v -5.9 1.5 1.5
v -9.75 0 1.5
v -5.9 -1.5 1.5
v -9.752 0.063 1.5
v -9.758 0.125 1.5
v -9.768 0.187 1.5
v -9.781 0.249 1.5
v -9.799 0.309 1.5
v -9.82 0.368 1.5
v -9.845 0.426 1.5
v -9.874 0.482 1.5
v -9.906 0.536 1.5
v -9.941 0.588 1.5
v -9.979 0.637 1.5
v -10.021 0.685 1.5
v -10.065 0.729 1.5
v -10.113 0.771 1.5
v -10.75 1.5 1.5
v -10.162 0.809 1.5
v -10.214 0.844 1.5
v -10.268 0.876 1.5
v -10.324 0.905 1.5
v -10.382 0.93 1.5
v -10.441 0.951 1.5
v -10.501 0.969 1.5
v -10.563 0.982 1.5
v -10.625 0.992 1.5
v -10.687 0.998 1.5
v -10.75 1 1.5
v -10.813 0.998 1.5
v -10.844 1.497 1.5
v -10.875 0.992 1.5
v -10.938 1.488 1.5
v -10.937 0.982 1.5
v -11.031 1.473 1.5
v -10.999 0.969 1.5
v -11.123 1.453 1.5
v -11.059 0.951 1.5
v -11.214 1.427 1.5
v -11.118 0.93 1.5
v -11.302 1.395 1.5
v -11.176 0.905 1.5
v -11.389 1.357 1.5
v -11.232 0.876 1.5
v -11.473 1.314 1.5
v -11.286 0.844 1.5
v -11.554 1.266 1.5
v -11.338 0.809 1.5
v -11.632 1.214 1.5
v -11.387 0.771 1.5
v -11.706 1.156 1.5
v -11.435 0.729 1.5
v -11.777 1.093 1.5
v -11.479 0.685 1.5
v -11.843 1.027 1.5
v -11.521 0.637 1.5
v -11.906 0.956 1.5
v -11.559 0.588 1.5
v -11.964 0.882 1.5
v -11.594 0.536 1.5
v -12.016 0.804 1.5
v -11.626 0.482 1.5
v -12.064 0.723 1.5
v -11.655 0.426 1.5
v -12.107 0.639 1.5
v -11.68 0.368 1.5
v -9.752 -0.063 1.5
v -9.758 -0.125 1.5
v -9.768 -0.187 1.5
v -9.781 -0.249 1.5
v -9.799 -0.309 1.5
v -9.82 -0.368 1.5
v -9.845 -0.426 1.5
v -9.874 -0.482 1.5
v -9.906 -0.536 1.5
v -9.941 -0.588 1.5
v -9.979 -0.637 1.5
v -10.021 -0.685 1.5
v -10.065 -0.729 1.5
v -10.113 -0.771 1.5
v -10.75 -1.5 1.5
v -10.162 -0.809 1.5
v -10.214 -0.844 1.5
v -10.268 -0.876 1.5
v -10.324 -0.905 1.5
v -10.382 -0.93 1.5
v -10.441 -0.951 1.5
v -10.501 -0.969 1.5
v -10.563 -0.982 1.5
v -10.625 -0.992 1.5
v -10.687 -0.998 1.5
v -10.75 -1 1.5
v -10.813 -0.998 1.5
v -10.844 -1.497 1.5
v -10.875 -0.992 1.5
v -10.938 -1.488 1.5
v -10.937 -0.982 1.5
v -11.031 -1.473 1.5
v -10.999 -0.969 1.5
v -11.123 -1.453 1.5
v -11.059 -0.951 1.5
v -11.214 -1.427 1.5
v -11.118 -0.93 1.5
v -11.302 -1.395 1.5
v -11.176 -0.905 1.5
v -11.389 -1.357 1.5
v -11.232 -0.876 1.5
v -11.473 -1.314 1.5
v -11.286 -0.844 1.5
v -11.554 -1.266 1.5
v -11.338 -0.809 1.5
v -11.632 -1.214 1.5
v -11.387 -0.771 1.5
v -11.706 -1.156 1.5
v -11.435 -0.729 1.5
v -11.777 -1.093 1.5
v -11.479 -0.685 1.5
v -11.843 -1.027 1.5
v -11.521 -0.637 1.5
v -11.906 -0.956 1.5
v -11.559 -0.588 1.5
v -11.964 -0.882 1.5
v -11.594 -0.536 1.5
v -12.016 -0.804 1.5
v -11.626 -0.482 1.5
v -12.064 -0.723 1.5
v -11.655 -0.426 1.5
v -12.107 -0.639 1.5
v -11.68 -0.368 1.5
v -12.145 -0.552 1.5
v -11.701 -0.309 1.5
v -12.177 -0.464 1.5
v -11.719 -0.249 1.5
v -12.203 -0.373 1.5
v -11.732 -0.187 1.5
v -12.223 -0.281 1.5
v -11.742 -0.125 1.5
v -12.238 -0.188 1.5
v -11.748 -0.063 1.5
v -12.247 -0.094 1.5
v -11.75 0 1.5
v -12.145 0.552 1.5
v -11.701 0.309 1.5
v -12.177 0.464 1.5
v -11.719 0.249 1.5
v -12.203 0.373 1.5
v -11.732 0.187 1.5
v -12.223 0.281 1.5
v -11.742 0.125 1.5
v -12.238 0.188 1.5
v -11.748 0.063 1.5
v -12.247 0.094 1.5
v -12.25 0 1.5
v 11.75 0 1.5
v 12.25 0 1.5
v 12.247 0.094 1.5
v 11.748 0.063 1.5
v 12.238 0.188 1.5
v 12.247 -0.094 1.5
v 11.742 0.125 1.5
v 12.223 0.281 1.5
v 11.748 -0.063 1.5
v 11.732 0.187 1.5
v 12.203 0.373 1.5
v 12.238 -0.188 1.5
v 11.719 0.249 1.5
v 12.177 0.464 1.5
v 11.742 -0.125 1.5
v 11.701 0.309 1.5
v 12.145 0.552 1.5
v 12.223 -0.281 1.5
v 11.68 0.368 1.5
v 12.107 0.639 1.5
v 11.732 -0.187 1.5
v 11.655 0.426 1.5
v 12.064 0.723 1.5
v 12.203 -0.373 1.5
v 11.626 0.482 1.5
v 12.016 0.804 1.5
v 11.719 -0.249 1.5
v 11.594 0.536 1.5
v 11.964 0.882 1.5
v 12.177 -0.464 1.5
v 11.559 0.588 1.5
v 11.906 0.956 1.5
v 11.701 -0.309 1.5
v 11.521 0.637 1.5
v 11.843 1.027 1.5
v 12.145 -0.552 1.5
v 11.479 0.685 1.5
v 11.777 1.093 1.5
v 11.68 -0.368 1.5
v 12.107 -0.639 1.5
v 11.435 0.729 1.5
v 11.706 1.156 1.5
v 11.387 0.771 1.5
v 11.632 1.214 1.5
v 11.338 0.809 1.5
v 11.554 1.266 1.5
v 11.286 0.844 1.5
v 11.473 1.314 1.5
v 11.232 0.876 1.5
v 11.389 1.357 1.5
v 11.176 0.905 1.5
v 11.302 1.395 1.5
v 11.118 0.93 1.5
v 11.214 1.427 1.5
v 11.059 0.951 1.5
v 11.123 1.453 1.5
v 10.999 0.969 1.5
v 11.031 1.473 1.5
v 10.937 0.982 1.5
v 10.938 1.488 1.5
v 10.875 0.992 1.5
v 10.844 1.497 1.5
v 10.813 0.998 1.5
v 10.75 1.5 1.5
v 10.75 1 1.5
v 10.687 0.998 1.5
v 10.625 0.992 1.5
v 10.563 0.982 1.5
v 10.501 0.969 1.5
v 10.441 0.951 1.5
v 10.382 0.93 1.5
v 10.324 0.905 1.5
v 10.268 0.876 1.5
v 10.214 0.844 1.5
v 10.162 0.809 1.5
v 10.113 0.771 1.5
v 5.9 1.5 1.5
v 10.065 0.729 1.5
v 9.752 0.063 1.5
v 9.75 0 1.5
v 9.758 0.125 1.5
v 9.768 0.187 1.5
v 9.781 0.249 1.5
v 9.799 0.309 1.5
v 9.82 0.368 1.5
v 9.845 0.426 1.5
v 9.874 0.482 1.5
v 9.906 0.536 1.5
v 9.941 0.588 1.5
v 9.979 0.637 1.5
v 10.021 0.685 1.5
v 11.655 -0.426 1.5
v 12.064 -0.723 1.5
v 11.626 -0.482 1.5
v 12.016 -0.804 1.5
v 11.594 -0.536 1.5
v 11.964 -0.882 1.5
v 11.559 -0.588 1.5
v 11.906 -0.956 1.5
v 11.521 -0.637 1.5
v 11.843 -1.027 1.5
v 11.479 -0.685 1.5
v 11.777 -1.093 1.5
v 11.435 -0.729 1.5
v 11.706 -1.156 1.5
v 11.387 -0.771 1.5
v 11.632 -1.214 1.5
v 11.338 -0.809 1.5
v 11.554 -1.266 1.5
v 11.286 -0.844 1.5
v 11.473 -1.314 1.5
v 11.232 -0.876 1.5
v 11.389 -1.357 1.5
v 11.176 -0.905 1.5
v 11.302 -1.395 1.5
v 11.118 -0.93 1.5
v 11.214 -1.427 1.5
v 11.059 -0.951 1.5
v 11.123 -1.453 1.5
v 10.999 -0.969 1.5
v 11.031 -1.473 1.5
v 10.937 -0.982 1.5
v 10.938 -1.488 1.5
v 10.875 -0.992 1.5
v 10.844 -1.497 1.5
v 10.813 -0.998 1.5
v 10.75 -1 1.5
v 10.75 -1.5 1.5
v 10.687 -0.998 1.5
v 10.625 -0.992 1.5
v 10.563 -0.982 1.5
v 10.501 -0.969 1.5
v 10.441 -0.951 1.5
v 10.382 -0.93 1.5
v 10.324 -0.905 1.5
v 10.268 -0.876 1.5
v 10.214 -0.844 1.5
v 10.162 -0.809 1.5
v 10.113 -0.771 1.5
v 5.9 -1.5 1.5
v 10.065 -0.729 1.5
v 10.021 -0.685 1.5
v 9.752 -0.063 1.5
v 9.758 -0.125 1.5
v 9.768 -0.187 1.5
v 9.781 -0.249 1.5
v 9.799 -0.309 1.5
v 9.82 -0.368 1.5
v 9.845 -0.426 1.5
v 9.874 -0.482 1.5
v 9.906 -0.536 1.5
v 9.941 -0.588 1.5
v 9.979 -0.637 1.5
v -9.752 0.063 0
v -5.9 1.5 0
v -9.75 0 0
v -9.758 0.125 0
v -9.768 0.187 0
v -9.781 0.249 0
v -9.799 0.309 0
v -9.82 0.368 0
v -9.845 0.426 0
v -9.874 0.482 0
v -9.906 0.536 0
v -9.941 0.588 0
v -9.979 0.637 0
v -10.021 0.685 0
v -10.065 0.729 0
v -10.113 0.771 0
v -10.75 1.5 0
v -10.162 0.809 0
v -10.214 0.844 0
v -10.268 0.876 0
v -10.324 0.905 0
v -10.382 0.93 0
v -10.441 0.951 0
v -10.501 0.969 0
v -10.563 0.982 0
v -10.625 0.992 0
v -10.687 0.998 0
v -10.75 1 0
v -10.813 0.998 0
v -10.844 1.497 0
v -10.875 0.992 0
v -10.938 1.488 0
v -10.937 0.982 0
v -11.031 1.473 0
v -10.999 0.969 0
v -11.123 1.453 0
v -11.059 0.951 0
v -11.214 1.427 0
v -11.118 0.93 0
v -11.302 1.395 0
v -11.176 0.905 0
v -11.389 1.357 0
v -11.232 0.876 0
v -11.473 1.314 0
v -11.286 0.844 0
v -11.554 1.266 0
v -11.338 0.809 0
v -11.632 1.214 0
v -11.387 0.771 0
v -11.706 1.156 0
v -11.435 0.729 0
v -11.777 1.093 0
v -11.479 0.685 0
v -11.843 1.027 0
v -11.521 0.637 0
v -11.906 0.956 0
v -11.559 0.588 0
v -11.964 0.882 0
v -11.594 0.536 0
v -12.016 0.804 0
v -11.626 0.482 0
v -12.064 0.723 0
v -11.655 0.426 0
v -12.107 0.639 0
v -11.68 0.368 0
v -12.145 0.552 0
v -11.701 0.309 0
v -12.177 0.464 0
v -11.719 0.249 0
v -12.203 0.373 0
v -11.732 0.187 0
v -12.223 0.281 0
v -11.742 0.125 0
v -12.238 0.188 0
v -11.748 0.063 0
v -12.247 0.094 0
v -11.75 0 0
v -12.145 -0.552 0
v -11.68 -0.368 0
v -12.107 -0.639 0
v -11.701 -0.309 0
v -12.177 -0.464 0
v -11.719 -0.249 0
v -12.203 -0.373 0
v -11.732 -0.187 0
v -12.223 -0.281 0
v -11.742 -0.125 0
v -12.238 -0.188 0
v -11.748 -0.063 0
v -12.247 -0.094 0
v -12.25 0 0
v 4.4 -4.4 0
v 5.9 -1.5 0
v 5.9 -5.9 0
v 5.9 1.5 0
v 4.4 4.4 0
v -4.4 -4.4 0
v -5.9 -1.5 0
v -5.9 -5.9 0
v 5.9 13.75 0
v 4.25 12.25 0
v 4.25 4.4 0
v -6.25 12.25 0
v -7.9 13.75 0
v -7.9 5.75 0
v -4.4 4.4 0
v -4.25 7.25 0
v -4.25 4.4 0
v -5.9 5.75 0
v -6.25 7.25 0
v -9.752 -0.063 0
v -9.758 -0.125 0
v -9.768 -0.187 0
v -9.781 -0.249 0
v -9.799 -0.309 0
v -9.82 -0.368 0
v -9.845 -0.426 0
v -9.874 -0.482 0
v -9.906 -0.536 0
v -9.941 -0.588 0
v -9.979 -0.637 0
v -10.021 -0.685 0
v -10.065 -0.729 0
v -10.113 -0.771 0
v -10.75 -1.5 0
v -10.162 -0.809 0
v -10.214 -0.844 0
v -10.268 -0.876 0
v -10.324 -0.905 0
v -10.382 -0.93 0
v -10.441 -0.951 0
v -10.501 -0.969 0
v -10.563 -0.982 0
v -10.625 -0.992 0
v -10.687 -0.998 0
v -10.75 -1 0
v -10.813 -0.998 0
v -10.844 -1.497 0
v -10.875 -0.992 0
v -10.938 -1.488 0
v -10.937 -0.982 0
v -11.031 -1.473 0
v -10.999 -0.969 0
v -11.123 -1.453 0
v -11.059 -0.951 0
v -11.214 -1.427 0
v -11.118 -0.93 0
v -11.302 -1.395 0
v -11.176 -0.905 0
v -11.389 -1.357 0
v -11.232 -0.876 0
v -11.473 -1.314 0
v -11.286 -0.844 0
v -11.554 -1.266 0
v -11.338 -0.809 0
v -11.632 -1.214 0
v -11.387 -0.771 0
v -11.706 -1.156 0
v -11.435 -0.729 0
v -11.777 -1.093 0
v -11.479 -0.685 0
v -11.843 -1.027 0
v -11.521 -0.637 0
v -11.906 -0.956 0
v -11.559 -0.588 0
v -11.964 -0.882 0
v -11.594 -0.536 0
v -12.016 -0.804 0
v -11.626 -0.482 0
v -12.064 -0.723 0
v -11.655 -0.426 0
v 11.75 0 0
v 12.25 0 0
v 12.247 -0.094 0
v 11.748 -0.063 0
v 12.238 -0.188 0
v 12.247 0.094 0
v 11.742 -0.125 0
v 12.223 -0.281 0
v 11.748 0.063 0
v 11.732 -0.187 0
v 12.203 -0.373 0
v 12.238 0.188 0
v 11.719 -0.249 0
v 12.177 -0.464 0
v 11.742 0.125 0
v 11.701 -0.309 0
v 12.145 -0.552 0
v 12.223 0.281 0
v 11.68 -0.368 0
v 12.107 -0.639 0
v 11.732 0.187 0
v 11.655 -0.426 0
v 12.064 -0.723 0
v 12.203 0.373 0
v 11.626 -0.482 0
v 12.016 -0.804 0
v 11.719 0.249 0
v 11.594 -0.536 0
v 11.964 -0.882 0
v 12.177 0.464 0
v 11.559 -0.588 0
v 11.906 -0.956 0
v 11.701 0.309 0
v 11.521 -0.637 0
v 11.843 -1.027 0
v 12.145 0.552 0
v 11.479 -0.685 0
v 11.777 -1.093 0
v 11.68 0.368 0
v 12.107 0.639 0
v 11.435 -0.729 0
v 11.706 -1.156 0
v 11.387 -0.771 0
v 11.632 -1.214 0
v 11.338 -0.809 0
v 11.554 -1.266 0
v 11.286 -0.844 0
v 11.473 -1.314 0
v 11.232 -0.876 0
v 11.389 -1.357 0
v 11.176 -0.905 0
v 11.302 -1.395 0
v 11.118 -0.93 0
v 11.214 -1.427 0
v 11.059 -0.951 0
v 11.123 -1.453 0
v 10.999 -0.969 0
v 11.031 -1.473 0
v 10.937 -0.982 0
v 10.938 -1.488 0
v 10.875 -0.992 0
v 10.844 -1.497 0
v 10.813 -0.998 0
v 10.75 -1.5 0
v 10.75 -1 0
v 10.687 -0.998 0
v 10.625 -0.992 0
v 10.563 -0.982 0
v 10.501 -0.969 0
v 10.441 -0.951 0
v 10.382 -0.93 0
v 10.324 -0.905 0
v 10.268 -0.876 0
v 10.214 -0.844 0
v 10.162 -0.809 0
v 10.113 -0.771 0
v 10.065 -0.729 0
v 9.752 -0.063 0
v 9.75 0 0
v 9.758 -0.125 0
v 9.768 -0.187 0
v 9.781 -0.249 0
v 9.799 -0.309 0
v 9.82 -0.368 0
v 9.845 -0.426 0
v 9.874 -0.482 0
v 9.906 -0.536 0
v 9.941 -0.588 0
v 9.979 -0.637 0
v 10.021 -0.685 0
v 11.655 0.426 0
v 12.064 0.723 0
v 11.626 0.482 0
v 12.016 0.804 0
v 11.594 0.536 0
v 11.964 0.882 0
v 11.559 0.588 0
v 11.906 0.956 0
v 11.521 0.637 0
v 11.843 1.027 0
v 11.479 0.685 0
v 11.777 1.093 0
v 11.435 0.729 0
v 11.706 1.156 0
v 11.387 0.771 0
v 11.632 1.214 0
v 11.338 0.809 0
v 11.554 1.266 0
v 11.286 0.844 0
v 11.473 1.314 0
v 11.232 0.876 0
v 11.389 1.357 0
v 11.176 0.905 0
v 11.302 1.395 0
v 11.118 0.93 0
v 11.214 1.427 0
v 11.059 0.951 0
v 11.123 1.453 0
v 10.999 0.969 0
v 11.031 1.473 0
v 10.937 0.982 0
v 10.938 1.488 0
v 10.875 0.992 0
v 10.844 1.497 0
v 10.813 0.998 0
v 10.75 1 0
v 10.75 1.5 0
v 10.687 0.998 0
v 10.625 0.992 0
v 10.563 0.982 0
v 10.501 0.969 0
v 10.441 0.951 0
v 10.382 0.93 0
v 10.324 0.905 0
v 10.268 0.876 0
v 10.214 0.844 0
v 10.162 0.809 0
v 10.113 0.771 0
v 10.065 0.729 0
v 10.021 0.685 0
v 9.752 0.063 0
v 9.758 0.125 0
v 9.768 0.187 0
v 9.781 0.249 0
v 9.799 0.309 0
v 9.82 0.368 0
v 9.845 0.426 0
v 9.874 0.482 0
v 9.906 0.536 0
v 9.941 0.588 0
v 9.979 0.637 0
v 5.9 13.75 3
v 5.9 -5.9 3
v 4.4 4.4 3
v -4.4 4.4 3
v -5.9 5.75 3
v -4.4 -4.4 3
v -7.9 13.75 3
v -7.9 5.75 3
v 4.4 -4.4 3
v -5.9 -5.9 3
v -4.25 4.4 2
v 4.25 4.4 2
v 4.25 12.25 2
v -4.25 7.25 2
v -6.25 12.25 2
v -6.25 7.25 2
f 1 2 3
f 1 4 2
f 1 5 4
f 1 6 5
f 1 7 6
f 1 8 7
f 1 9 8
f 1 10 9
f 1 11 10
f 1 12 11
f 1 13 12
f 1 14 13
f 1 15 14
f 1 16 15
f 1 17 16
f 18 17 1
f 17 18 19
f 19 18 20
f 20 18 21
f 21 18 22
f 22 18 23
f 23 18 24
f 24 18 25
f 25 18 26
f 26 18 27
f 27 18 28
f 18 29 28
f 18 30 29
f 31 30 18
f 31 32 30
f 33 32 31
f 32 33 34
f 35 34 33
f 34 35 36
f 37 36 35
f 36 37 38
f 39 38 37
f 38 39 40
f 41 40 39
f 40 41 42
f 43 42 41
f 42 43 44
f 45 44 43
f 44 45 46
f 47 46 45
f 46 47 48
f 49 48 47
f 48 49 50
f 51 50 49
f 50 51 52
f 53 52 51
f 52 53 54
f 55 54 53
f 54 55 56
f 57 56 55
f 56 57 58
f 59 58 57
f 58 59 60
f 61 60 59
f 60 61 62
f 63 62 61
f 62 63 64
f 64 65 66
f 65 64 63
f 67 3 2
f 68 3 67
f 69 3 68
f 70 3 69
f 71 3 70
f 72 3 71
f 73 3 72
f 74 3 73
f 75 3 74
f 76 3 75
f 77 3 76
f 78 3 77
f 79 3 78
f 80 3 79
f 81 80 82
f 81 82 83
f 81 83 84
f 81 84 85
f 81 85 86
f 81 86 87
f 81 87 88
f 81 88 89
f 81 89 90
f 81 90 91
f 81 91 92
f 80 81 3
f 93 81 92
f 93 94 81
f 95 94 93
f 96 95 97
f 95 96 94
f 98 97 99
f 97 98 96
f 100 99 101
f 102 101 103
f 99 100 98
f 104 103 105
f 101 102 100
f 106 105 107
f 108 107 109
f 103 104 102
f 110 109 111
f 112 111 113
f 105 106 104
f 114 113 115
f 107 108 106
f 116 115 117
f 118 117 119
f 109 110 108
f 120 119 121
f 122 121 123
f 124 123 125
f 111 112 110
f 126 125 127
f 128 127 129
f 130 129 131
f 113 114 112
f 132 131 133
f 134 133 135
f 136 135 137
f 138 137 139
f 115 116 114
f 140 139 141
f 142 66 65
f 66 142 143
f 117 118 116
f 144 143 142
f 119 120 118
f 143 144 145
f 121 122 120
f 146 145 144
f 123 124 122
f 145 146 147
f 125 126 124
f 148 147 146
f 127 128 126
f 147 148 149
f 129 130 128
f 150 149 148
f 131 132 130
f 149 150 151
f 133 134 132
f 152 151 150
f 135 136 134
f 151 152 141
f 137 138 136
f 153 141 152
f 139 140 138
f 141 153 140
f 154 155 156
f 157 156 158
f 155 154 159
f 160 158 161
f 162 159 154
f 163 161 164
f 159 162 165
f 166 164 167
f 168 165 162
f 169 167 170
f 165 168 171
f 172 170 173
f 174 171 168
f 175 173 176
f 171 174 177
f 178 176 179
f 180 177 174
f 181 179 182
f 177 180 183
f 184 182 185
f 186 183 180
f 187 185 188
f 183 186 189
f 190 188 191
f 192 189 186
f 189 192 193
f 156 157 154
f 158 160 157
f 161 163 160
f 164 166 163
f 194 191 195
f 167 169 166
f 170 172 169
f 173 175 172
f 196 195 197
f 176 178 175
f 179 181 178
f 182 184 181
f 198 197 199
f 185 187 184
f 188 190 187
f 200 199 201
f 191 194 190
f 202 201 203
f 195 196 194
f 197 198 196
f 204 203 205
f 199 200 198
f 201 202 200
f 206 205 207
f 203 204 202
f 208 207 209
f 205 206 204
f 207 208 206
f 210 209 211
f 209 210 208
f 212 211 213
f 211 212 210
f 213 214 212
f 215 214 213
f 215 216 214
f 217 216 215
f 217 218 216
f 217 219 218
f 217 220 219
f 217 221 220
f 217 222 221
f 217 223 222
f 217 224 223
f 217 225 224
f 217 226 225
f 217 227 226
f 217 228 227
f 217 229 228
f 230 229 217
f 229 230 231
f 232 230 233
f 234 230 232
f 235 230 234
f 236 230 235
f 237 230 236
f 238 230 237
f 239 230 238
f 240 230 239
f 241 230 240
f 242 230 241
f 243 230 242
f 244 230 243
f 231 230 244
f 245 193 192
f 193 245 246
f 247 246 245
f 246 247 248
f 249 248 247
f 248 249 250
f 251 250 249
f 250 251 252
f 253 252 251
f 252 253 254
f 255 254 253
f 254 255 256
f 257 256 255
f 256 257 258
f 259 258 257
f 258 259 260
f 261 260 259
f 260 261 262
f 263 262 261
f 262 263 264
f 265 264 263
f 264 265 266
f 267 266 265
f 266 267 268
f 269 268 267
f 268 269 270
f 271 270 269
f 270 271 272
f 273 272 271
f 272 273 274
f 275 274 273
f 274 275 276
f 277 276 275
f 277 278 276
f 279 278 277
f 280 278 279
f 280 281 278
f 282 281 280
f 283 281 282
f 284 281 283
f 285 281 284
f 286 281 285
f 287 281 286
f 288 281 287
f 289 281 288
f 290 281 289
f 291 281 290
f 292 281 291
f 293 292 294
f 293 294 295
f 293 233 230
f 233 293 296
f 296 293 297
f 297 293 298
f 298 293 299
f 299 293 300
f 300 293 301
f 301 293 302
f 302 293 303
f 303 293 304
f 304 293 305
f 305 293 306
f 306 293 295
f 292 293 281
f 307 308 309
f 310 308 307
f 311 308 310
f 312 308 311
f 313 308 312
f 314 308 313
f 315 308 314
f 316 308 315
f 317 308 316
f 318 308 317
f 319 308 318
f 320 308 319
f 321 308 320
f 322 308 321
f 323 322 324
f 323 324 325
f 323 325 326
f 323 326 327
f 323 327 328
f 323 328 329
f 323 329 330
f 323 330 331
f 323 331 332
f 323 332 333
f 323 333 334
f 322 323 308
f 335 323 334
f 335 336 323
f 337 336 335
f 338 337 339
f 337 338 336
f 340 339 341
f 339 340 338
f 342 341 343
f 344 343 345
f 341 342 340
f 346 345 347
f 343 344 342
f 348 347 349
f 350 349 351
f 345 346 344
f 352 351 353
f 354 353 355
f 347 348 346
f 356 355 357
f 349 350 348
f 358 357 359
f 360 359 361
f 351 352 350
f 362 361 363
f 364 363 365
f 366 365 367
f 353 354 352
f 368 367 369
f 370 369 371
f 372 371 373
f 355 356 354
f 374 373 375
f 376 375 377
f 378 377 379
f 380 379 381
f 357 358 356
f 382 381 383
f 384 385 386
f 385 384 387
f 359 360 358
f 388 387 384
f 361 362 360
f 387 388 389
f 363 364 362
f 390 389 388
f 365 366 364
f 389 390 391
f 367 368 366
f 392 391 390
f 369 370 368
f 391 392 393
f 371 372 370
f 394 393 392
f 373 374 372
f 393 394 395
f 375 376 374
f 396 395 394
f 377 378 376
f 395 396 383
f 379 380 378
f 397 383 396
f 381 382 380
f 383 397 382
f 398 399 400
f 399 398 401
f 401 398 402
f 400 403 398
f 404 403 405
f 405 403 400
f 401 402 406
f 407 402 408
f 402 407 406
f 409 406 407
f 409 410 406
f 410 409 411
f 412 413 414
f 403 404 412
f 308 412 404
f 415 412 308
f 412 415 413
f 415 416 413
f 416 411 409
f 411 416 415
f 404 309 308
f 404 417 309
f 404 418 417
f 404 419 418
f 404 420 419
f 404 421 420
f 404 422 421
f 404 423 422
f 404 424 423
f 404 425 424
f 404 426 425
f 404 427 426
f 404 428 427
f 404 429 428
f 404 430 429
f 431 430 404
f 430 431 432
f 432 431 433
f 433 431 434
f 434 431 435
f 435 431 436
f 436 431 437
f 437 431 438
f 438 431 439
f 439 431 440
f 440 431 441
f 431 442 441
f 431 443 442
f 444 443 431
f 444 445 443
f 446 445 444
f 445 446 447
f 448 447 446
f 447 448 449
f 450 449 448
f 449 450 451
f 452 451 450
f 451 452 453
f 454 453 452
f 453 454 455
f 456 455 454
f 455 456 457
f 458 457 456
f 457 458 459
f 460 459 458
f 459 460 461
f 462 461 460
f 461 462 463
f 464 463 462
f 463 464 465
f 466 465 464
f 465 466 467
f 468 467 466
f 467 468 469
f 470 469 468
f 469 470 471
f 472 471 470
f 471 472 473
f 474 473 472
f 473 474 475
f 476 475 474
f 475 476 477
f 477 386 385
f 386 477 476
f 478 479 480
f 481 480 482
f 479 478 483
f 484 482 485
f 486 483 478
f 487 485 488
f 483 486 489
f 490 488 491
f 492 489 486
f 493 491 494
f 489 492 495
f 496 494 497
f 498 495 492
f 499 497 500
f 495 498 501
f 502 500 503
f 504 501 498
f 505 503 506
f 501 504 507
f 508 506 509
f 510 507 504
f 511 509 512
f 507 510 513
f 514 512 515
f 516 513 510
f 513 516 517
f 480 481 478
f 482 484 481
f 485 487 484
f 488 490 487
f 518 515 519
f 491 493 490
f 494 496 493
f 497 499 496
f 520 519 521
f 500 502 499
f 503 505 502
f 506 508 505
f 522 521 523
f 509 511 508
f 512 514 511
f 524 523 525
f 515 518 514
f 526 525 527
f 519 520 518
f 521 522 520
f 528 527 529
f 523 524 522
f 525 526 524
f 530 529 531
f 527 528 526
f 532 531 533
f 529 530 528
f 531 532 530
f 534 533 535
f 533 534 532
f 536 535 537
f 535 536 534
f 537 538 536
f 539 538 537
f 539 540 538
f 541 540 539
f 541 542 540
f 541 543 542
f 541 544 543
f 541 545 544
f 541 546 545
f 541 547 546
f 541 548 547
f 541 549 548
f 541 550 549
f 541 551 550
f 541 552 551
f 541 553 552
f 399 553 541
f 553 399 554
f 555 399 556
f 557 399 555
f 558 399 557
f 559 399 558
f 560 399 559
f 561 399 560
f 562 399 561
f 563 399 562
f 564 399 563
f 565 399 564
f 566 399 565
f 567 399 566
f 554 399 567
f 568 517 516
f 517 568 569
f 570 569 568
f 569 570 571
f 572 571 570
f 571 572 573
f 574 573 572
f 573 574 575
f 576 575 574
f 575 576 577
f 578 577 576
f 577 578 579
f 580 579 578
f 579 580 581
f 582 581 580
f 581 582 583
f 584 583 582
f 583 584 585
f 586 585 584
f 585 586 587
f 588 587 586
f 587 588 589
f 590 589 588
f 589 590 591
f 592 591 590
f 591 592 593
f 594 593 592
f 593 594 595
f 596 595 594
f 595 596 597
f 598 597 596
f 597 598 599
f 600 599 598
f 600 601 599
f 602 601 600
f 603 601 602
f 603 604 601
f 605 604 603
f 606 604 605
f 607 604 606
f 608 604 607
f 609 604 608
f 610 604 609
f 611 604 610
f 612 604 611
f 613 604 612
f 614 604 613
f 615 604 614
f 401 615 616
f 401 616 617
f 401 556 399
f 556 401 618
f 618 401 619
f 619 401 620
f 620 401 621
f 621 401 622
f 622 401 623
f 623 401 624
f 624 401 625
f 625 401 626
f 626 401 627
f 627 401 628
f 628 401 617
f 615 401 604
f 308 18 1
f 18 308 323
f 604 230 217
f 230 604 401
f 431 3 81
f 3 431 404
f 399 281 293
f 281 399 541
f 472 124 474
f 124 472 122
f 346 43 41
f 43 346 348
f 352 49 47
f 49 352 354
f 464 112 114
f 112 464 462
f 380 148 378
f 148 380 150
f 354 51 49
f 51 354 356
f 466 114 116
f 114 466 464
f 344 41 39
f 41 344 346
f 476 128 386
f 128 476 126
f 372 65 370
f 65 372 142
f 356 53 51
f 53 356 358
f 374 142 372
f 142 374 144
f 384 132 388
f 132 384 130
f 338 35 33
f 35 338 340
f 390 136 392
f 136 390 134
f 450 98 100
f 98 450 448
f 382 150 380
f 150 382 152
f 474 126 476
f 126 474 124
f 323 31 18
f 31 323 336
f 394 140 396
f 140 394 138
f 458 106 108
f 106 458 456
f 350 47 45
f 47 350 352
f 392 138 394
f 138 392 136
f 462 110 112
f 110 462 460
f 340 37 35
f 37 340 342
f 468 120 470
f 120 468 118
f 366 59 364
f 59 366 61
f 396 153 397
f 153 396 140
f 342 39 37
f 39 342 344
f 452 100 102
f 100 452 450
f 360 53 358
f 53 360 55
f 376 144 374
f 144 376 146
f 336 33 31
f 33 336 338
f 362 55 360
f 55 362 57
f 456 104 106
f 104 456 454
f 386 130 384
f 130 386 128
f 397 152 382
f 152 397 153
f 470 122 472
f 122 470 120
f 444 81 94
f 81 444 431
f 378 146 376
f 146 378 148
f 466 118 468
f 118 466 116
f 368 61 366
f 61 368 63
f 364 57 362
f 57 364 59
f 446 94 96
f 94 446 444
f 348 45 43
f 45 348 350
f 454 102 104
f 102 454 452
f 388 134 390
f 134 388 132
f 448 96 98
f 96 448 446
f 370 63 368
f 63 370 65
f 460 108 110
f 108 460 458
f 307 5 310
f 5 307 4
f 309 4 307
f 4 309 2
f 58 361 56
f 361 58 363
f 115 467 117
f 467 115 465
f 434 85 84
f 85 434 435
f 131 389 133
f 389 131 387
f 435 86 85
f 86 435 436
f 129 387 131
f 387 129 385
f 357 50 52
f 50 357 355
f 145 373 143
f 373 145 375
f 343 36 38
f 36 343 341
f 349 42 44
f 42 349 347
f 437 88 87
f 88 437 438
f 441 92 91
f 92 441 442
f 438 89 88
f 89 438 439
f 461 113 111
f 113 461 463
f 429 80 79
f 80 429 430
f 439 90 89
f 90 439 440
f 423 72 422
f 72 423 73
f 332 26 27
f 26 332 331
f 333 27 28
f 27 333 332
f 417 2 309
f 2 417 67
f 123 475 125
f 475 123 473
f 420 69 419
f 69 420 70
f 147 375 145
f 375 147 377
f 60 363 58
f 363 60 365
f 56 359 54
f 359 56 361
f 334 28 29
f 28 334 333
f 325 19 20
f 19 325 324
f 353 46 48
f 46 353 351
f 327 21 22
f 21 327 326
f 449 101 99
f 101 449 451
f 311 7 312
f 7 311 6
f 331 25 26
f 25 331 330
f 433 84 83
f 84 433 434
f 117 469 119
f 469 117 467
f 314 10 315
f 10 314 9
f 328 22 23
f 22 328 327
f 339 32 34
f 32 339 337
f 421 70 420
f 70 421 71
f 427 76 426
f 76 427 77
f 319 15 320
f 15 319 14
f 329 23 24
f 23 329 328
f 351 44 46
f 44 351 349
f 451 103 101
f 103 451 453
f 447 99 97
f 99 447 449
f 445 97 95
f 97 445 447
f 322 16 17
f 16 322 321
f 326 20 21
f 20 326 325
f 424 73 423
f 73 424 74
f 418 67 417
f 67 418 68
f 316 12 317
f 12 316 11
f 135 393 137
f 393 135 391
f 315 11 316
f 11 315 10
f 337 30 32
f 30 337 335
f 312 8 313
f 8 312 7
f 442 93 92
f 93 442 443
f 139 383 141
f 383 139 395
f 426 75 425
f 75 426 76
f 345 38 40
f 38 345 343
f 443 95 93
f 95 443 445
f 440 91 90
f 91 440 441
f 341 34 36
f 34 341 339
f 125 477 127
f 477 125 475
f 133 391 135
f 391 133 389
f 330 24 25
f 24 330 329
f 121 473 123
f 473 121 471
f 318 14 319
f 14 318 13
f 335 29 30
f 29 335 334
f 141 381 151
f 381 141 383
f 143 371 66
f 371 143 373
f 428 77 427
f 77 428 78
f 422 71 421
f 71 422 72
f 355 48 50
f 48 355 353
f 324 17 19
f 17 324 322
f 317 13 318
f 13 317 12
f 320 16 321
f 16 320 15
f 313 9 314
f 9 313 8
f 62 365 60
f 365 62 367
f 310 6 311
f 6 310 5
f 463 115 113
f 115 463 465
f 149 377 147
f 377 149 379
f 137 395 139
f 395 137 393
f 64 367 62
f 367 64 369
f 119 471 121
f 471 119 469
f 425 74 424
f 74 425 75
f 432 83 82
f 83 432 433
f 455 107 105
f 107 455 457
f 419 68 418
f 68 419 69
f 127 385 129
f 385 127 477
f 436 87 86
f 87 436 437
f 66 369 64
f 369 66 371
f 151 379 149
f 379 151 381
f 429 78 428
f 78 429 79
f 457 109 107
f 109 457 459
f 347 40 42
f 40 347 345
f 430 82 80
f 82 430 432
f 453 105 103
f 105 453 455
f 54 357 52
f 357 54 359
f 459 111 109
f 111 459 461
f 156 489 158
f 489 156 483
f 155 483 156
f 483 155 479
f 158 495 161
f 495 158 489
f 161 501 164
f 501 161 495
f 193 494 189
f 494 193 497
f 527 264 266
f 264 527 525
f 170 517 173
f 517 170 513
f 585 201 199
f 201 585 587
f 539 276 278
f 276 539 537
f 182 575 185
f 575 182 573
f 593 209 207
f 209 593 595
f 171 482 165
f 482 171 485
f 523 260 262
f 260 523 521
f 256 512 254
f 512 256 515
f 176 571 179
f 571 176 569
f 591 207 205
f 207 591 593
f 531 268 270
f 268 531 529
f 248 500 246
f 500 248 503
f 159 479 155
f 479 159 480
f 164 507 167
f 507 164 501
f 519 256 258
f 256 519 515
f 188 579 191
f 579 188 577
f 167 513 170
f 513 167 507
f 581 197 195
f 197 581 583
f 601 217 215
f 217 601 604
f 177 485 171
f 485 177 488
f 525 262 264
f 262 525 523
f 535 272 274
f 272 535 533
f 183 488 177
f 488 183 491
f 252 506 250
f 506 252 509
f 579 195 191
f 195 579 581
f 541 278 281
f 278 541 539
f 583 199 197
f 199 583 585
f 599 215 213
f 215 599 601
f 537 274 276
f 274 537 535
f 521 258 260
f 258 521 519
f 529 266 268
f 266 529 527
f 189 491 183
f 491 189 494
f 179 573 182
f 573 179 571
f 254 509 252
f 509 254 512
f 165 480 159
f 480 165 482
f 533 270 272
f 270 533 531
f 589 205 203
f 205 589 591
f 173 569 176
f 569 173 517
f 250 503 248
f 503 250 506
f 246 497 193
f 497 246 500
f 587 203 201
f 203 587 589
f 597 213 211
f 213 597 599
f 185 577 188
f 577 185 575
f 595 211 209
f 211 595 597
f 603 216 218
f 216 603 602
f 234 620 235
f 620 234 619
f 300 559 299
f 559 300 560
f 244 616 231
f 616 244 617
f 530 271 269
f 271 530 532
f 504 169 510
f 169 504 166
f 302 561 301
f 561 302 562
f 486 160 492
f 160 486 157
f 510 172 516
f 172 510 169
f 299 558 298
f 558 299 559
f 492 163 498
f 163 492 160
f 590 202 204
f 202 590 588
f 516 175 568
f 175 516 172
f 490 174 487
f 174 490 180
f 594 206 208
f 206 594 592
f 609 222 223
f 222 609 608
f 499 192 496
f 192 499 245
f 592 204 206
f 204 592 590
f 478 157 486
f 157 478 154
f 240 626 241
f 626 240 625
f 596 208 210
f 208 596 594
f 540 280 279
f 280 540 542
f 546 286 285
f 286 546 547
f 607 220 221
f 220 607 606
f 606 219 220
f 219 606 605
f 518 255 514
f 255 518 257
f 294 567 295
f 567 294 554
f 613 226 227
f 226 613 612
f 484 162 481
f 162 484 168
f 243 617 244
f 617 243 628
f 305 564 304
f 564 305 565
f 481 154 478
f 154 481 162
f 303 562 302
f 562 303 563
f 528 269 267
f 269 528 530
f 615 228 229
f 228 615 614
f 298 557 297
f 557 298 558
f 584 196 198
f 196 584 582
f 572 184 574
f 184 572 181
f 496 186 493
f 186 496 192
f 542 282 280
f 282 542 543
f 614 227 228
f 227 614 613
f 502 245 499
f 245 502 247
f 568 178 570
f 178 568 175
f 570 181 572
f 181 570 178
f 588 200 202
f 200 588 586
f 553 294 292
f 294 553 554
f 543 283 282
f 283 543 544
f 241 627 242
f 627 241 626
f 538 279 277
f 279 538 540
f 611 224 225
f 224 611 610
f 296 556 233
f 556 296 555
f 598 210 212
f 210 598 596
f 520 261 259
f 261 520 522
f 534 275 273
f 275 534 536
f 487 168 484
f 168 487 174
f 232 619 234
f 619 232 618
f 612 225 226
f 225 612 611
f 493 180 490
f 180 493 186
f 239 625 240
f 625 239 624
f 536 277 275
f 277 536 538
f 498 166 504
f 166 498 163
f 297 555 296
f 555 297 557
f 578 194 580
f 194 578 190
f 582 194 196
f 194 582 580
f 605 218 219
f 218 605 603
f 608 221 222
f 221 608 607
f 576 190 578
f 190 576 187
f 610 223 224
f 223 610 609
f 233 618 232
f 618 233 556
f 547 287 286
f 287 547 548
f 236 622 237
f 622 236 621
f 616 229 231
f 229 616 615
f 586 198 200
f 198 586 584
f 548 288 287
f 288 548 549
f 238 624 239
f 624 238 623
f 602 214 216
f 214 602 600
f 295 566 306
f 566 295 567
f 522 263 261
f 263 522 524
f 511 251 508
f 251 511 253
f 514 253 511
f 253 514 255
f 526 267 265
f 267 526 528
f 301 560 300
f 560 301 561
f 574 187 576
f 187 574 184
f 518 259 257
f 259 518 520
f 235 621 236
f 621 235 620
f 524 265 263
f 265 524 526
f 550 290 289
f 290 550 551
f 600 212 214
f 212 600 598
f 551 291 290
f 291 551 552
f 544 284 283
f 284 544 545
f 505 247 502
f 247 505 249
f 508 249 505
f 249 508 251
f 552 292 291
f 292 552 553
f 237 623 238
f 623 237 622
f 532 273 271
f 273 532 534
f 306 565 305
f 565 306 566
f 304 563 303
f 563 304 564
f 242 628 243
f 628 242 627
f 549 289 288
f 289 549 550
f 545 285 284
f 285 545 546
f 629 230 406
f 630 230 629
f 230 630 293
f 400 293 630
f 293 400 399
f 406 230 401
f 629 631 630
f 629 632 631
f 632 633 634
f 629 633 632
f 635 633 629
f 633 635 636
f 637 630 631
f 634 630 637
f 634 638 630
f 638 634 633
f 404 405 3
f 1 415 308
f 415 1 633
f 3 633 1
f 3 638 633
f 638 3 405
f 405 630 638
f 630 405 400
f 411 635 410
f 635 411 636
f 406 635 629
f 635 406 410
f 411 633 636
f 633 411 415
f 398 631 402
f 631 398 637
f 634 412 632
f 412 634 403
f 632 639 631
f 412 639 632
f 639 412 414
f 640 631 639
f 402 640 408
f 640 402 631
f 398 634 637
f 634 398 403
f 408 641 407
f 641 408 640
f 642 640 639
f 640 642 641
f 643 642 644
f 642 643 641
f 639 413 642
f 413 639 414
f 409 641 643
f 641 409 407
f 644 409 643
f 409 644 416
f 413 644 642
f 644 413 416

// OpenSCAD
/*
    With this code you can make an adaptor enclosure to attach the ambar filter over the raspberry camera V2. 
    I is used in the FluoPi project.
    
    Isaac Núñez 2024 (CC BY 4.0; https://creativecommons.org/licenses/by/4.0/) 
 
*/


////////////////////////////////////
//  Parameters  //


/// Armor parameters
xy_thick = 1.5 ; // wall thickness in x and y axis
z_thick = 1; // wall thickness in z axis

arms_z = 1.5 ; // arms to screw heigh 
scwhst = 0.5; // screw hole support thickness in r axis

///////////////////
// RPI V2 camera //
///////////////////

RPIV2_cam_x = 25 + 1 ; // 1mm of error
RPIV2_cam_y = 24; 
RPIV2_cam_z = 1 + 0.1; // PCB thickness, 0.1 mm of error


sb_ys = 0.5; // sensor base looseness space in y axis. To generate a non-simetrical looseness.

RPIV2_sensor_x = 8.5; // sensor base length (8.5 mm). Use minimal or any losseness (we want it to be tight around the base to helping support it realted the zoom twist movements).
RPIV2_sensor_y = 8.5; // Deep
RPIV2_sensor_z = 3; // sensor base heigh, just the square part (without the lens cylindrical base).
sxyloos = 0.3; // sensor xy looseness

RPIV2_sensor_bottom = 5; // distance from sensor square to PCB bottom (the side with the cable)

//sensor conector to PCB
sc_z = 1.5 + 0.5; // heigh. Give to it a good looseness (0.5).

sc_y1 = 3; // section closer to sensor.
sc_y2 = 5; // section closer to border
sc_x1 = 2; // section sticking out from the edge

//sensor lens
sL_re = 5.4/2+0.3; // external radius. 0.1 looseness
sL_h = 1.5; // heigh


V2_hold_x =(RPIV2_cam_x - RPIV2_sensor_x)/2 - 0.3;    // space between camera border and sensor base. 0.3 the security factor
V2_hold_y = 12.5 - 0.2;  // space between border and PCB first obstacle (sensor base or electronic componentes). 0.2 security value. Use value = 12.5 to attach with screws or 7 to not use them.
V2_lens_y = RPIV2_sensor_y/2 + RPIV2_sensor_bottom; // distance of the center of the lens to the bottom of the PCB (the side with the cable)

V2_scw_r = 1;   // camera screw radious (M2)
V2_scw_b = 9.2;  // distance from bottom to screw hole center
V2_scw_s = 1.75; // distance from side to screw hole center
V2_scw_f = 2; // distance from front (opposite side of the cable connector) to screw hole center
V2_cshc = 10.75; // PCB center to screw hole center

V2_cch = 2.8; // cable conector thickness
V2_ccx = 22; // cable conector wide (x axis)
V2_ccy = 5.5; // cable conector deep (y axis)




module sensor_space(){
    union(){
        // Sensor base
        translate([0,0,RPIV2_sensor_z/2])
        cube([RPIV2_sensor_x+sxyloos,RPIV2_sensor_y+sxyloos,RPIV2_sensor_z], center=true);
        
        //sensor connection to PCB, aligned portion
        translate([0,(RPIV2_sensor_y+sc_y1+sc_y2)/2,sc_z/2])
        cube([RPIV2_sensor_x,sc_y1+sc_y2,sc_z], center=true);
        //sensor connection to PCB, sticking out portion
        translate([-(RPIV2_sensor_x+sc_x1)/2,(RPIV2_sensor_y+sc_y2)/2+sc_y1,sc_z/2])
        cube([sc_x1,sc_y2,sc_z], center=true);
                
    }
    
}

module armor(){
    // to generate the RPIv2 armor
    
    acx1 = RPIV2_sensor_x+sxyloos + 2*xy_thick; // armor cube 1 x
    acy1 = RPIV2_sensor_y + xy_thick; // armor cube 1 y
    acz1 = RPIV2_sensor_z; // armor cube 1 z
    
    
    acy2 = sc_y1; // armor cube 2 y
    acz2 = sc_z + z_thick; // armor cube 2 z
    
    acx3 = acx1 + sc_x1; // armor cube 2 y
    acy3 = sc_y2+2*xy_thick; // armor cube 2 y
    
    difference(){
        
        // armor base estructure
        union(){
            //Sensor base armor
            translate([0, -xy_thick/2, acz1/2])
           cube([acx1 , acy1+sxyloos , acz1], center = true);
            //cable armor
            translate([0, (RPIV2_sensor_y+acy2)/2, acz2/2])
           cube([acx1, acy2, acz2], center = true);
            // conection to PCB armor
            translate([-sc_x1/2, (RPIV2_sensor_y+acy3)/2+acy2-xy_thick, acz2/2])
           cube([acx3, acy3, acz2], center = true);
            
            // screw supports
            xdispa = V2_cshc/2; //  x displacement arms
            xdisps = V2_cshc; //  x displacement screw supports 
            arms_y = 2*(V2_scw_r+scwhst); // arms wide in y axis
            scwsr = V2_scw_r+scwhst; // screw support radius
            
            for(a = [-1 ,1 ]){
                difference(){
                    union(){
                        // arms to screw
                        translate([a*xdispa,0, arms_z/2])
                       cube([V2_cshc, arms_y , arms_z], center = true);
                        
                        //Screw supports
                        translate([a*(xdisps),0,arms_z/2])
                        cylinder(h=arms_z, r=scwsr, $fn=100, center =true);
                    }
                    //screw holes
                    translate([a*(xdisps),0,arms_z/2])
                    cylinder(h=arms_z, r=V2_scw_r, $fn=100, center =true);
                }
                
            }
        }
        
        // Sensor elements space
        sensor_space();
    }
    
    
    
}

module filter_support(h){
    union(){
        // filter support ring
        difference(){
            cylinder(h=h, r=re, $fn=120, center =true);
            // filter space
            translate([0,0,bottom_thick])
            cylinder(h=h, r=rf, $fn=120, center =true);
            //central hole    
            translate([0,0,-bottom_thick])    cylinder(h=h, r=ri, $fn=120, center =true);   
        }
        
        //lens attach
        // ring
        translate([0,0,(h+fat)/2])
        difference(){
            cylinder(h=fat, r=re, $fn=120, center =true);
            cylinder(h=fat, r=sL_re, $fn=120, center =true);
        }
        // union to lens piece
        translate([0,0,h/2])
        difference(){
            translate([0,0,sL_h/2])
            cylinder(h=sL_h, r=sL_re+3, $fn=120, center =true);
            lens();
        }
    }
    
}

//filter_support(h_fs);
//sensor_space();
armor();
